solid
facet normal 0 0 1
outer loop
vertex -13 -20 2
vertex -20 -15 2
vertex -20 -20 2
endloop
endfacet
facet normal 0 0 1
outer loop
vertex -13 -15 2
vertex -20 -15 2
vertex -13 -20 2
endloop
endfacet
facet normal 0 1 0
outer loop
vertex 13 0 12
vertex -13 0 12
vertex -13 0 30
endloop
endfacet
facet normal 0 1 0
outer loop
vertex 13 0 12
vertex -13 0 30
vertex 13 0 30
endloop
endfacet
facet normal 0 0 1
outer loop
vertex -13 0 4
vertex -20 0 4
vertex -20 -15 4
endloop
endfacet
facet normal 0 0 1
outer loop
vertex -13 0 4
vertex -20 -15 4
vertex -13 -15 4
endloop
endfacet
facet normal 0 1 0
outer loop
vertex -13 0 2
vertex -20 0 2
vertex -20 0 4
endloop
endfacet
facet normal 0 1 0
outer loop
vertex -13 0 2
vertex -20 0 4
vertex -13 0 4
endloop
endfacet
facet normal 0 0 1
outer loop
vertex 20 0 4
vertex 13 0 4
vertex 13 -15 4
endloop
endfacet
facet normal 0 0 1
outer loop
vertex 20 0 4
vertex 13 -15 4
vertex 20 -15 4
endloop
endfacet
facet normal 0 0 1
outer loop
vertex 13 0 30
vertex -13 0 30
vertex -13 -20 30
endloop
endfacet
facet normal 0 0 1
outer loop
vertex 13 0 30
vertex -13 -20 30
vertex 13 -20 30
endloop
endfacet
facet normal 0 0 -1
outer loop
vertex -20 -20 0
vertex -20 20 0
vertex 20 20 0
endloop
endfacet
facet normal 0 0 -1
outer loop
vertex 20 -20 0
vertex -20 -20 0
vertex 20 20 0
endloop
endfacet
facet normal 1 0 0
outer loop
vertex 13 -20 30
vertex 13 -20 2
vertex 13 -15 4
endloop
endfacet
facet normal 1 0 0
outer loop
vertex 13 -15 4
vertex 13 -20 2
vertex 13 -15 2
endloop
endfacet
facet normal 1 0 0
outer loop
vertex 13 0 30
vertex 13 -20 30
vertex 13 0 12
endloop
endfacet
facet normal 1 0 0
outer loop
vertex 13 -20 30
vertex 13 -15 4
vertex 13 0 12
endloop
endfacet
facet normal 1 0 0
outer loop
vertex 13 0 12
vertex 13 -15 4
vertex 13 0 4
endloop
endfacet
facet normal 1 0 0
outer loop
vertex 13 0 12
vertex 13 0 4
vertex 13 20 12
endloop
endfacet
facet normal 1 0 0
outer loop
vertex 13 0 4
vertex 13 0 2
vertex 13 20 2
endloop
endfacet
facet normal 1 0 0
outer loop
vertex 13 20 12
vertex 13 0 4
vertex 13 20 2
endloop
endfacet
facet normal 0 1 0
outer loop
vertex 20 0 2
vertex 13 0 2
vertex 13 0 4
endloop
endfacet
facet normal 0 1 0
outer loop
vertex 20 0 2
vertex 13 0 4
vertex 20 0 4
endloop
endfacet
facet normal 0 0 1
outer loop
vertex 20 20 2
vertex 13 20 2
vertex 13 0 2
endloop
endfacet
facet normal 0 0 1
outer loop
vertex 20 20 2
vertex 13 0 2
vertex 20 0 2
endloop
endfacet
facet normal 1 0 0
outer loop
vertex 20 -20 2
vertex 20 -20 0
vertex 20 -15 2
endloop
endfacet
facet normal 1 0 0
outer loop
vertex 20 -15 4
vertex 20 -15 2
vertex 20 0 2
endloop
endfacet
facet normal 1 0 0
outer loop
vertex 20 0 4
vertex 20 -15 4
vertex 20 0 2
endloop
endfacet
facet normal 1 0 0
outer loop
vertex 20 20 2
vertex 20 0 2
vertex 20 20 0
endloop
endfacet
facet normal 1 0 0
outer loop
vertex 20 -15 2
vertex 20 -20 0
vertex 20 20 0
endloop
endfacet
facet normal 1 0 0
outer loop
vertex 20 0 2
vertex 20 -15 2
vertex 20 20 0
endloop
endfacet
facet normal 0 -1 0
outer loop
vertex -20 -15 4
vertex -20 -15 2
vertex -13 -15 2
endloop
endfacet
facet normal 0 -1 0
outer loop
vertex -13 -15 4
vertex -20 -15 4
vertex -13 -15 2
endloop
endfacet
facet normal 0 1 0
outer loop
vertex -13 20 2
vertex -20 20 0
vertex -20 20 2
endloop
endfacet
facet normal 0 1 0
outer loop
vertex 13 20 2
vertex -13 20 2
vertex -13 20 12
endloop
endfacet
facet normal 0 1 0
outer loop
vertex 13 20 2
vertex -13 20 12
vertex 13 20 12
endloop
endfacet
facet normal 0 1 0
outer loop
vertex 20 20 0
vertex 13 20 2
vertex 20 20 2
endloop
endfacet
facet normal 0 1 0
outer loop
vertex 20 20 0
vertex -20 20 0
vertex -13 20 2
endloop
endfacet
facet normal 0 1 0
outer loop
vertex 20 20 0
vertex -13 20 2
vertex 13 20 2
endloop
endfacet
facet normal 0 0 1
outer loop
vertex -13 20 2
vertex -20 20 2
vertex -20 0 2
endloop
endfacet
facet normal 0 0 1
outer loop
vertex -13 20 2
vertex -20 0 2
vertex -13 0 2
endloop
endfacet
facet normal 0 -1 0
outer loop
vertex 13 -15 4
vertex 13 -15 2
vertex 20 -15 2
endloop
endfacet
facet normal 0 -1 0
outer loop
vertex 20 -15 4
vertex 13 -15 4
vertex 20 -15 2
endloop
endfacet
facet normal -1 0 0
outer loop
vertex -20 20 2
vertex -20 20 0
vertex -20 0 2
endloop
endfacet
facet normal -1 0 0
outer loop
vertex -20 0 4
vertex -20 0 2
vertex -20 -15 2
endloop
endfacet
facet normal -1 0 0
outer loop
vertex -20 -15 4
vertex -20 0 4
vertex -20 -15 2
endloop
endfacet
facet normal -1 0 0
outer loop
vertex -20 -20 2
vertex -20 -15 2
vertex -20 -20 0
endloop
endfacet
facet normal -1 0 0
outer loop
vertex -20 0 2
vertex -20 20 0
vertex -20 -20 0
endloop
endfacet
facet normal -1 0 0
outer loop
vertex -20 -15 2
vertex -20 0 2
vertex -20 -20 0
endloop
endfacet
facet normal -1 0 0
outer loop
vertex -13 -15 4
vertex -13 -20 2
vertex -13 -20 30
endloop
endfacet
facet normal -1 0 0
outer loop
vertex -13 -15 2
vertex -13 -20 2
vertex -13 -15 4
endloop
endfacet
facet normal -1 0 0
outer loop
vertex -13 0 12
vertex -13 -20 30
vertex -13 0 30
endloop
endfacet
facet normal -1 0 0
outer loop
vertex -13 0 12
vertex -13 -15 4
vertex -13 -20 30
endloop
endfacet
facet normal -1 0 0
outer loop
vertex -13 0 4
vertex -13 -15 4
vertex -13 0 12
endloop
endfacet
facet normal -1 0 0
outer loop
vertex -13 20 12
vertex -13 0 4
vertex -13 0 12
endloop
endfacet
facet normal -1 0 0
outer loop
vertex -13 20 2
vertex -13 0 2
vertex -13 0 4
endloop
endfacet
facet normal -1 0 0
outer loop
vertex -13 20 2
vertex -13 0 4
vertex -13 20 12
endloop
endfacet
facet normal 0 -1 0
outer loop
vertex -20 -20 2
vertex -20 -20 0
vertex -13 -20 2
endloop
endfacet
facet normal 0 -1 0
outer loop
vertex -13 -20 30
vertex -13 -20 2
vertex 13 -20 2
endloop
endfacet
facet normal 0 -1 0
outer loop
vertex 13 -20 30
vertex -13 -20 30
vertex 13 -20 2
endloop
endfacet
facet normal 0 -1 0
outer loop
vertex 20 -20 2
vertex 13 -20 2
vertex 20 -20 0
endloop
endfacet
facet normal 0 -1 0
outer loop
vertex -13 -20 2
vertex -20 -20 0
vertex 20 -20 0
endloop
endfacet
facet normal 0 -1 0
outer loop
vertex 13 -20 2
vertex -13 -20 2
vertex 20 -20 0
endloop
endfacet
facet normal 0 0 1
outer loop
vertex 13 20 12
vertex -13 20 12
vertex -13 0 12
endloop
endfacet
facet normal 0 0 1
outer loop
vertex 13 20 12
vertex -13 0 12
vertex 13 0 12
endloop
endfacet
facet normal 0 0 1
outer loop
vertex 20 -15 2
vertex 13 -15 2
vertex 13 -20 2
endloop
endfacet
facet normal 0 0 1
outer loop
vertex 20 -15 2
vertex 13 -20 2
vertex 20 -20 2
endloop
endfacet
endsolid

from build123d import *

# Parameters (mm, degrees)
F1_DEPTH = 2
F0_W     = 26
F0_H     = 20
F2_DEPTH = 30
F3_W     = 26
F3_H     = 20
F4_DEPTH = 10
F5_W     = 7
F5_H     = 15
F6_DEPTH = 2


with BuildPart() as f1:
    # F0 (on Top) → F1 (new body)
    with BuildSketch(Plane.XY):
        Polygon((20, -20), (20, 20), (-20, 20), (-20, -20), (-13, -20), (-13, 0), (13, 0), (13, -20), align=None)
    extrude(amount=F1_DEPTH)



with BuildPart() as f2:
    # F0 (on Top) → F2 (new body)
    with BuildSketch(Plane.XY):
        with Locations((0, -10)):
            Rectangle(F0_W, F0_H)
    extrude(amount=F2_DEPTH)


with BuildPart() as f1_1:
    add(f1.part)

    add(f2.part)  # F4 merges F2
    # F3 (on face) → F4 (join)
    with BuildSketch(Plane.XY.offset(2)):
        with Locations((0, 10)):
            Rectangle(F3_W, F3_H)
    extrude(amount=F4_DEPTH)

    # F5 (on face) → F6 (join)
    with BuildSketch(Plane.XY.offset(2)):
        with Locations((16.5, -7.5)):
            Rectangle(F5_W, F5_H)
        with Locations((-16.5, -7.5)):
            Rectangle(F5_W, F5_H)
    extrude(amount=F6_DEPTH)


solid = f1_1.part
